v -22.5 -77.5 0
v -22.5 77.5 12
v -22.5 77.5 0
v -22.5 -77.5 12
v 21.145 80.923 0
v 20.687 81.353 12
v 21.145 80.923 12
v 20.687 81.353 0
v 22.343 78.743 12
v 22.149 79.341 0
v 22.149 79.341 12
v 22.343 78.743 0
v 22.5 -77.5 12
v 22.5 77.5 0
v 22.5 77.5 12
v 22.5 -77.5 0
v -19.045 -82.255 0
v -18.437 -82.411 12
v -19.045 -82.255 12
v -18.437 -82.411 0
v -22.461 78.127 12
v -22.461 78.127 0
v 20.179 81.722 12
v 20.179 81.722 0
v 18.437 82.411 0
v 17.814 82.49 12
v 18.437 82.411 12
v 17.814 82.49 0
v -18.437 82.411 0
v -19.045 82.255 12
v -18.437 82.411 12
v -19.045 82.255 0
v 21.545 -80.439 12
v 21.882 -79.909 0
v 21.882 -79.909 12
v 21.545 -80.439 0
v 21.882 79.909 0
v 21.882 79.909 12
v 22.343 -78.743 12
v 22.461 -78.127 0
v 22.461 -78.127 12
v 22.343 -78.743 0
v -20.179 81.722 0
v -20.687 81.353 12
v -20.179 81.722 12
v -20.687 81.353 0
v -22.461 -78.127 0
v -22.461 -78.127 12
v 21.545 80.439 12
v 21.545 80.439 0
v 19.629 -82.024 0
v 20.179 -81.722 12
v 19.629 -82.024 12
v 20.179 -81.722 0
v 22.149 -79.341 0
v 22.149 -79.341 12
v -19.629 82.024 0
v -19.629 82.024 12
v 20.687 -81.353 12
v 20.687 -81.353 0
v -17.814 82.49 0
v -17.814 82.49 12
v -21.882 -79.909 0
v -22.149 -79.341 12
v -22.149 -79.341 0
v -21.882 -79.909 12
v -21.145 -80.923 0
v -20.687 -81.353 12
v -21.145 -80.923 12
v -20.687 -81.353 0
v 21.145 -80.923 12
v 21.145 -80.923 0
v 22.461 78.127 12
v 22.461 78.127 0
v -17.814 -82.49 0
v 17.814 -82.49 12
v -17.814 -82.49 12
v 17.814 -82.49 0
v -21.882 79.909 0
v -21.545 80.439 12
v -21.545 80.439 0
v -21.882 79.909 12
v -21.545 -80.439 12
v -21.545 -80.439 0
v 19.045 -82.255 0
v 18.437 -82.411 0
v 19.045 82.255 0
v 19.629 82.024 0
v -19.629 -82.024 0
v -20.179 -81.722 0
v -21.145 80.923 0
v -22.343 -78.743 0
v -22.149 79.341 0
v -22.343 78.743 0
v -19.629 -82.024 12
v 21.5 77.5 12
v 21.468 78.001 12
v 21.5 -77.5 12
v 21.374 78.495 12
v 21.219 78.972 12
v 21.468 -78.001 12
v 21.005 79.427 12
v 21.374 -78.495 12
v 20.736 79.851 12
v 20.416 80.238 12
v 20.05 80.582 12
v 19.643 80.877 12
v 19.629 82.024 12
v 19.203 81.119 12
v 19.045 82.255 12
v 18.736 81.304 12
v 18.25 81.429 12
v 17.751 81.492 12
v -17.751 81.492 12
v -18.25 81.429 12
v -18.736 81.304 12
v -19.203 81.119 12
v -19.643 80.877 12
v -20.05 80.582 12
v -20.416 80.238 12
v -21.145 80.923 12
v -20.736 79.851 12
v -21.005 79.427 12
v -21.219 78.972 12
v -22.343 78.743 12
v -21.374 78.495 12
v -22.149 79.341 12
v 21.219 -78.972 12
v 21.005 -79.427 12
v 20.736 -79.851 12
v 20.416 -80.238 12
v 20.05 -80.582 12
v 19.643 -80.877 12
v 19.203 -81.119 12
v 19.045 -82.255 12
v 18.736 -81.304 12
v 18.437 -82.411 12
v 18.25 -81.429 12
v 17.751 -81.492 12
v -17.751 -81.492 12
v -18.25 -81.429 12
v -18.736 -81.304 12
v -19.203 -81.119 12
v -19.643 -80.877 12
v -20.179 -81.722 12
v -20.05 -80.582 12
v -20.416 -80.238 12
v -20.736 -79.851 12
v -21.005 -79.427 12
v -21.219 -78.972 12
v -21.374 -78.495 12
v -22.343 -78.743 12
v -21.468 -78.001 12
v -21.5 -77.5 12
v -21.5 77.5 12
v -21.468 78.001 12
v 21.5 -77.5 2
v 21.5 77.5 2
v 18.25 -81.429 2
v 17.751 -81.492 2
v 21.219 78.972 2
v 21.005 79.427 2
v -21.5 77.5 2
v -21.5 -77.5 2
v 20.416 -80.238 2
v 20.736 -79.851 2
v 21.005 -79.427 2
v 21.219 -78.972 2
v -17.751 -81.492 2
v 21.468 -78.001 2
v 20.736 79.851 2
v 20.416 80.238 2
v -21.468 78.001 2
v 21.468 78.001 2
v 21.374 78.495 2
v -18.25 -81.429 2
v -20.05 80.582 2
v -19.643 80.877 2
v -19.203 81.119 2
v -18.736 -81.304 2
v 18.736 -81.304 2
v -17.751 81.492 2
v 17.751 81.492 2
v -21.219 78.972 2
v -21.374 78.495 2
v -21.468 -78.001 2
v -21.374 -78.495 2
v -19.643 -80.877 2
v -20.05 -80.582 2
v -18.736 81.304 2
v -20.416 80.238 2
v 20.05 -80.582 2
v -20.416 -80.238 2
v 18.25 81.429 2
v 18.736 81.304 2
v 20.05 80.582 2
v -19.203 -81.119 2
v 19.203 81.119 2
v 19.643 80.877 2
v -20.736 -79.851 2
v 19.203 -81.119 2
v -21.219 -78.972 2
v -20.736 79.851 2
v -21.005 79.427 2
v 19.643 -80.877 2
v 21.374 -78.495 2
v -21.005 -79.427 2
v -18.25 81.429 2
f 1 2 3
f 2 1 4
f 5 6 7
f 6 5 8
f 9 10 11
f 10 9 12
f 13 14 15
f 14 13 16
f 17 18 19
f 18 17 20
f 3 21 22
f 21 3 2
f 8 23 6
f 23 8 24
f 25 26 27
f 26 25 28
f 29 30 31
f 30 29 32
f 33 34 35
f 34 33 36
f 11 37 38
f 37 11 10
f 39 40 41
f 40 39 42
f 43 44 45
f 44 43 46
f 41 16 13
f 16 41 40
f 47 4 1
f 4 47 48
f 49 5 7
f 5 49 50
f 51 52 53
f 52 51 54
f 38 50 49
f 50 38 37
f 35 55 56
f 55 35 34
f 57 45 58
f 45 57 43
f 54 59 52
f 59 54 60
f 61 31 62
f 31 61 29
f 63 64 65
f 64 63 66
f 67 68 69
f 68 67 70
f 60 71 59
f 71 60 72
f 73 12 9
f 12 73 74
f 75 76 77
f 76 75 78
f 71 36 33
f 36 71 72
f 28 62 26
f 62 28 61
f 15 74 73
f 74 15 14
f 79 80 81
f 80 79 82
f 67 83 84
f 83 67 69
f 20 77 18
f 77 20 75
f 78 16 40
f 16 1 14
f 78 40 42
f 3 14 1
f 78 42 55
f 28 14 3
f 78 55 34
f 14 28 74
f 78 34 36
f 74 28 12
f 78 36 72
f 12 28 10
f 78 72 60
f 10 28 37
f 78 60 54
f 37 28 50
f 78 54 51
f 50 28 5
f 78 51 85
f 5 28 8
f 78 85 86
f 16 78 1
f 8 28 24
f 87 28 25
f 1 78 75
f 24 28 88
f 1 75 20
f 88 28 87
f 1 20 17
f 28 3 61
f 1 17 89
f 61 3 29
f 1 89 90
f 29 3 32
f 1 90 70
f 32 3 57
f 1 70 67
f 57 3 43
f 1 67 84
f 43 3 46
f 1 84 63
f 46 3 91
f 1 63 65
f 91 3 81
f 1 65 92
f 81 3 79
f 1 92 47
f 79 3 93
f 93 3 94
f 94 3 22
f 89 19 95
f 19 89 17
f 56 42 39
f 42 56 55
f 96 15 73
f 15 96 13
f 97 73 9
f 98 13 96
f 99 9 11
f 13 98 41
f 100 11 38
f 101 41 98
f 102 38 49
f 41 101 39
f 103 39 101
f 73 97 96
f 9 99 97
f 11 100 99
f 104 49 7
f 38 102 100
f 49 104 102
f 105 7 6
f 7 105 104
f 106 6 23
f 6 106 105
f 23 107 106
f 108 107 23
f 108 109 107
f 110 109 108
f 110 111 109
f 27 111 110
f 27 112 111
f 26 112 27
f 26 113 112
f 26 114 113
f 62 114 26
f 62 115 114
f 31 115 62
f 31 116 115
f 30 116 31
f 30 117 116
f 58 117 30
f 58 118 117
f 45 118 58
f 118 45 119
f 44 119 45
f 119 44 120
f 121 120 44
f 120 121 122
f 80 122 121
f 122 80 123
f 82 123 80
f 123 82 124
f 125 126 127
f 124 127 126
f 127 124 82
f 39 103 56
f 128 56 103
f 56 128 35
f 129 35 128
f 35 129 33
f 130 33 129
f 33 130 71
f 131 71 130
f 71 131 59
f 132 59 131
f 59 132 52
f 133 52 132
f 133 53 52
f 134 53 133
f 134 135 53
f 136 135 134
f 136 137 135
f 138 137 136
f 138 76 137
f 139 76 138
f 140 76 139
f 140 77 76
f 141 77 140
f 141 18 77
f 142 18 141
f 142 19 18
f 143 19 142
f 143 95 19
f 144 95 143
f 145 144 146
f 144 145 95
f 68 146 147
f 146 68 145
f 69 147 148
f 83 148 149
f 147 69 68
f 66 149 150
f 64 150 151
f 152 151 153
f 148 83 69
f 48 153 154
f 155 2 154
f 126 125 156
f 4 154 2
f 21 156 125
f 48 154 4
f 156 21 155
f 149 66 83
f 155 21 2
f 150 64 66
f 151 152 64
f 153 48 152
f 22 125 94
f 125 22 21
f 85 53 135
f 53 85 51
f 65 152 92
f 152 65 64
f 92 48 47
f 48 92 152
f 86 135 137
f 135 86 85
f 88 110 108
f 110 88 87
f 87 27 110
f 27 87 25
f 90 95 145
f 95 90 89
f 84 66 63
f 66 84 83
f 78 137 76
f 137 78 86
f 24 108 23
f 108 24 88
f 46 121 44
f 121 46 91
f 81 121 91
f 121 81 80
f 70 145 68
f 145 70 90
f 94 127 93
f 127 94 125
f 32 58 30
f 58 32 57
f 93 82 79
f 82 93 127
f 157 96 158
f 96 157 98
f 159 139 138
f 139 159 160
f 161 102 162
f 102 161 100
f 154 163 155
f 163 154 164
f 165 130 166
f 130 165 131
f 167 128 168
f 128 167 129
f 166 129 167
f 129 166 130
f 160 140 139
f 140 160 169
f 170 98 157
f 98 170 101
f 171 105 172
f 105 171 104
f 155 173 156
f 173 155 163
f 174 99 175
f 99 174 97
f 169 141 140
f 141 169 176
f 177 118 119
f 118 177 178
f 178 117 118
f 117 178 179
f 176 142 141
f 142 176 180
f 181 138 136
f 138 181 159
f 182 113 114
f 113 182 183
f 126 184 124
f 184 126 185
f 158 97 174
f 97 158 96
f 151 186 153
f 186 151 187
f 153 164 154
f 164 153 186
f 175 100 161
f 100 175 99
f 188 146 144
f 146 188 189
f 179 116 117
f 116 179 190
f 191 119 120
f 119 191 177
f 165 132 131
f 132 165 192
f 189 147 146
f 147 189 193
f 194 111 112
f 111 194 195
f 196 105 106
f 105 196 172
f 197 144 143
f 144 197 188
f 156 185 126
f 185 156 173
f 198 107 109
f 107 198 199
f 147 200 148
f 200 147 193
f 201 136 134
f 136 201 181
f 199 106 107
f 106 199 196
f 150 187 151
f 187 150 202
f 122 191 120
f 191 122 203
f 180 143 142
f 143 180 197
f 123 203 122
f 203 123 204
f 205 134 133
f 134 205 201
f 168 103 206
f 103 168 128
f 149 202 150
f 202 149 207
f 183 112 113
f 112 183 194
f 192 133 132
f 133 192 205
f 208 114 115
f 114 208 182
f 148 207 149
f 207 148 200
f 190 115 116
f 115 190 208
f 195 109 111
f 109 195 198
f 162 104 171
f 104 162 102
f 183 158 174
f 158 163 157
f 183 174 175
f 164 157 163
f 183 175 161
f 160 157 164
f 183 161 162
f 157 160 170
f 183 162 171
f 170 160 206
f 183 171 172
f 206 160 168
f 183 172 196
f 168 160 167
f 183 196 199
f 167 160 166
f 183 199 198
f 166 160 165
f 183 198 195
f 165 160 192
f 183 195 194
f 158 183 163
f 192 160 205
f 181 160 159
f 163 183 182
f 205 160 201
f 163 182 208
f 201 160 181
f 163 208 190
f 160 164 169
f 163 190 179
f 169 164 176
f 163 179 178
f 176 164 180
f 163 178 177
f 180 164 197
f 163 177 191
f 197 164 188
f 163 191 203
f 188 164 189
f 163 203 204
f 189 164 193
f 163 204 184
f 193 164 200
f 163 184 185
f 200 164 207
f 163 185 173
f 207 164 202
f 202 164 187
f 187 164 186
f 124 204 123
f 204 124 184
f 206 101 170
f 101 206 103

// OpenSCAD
$fn = 50;


difference() {
	union() {
		hull() {
			translate(v = [-17.5000000000, 77.5000000000, 0]) {
				cylinder(h = 12, r = 5);
			}
			translate(v = [17.5000000000, 77.5000000000, 0]) {
				cylinder(h = 12, r = 5);
			}
			translate(v = [-17.5000000000, -77.5000000000, 0]) {
				cylinder(h = 12, r = 5);
			}
			translate(v = [17.5000000000, -77.5000000000, 0]) {
				cylinder(h = 12, r = 5);
			}
		}
	}
	union() {
		translate(v = [0, 0, 2]) {
			hull() {
				translate(v = [-17.5000000000, 77.5000000000, 0]) {
					cylinder(h = 10, r = 4);
				}
				translate(v = [17.5000000000, 77.5000000000, 0]) {
					cylinder(h = 10, r = 4);
				}
				translate(v = [-17.5000000000, -77.5000000000, 0]) {
					cylinder(h = 10, r = 4);
				}
				translate(v = [17.5000000000, -77.5000000000, 0]) {
					cylinder(h = 10, r = 4);
				}
			}
		}
	}
}
